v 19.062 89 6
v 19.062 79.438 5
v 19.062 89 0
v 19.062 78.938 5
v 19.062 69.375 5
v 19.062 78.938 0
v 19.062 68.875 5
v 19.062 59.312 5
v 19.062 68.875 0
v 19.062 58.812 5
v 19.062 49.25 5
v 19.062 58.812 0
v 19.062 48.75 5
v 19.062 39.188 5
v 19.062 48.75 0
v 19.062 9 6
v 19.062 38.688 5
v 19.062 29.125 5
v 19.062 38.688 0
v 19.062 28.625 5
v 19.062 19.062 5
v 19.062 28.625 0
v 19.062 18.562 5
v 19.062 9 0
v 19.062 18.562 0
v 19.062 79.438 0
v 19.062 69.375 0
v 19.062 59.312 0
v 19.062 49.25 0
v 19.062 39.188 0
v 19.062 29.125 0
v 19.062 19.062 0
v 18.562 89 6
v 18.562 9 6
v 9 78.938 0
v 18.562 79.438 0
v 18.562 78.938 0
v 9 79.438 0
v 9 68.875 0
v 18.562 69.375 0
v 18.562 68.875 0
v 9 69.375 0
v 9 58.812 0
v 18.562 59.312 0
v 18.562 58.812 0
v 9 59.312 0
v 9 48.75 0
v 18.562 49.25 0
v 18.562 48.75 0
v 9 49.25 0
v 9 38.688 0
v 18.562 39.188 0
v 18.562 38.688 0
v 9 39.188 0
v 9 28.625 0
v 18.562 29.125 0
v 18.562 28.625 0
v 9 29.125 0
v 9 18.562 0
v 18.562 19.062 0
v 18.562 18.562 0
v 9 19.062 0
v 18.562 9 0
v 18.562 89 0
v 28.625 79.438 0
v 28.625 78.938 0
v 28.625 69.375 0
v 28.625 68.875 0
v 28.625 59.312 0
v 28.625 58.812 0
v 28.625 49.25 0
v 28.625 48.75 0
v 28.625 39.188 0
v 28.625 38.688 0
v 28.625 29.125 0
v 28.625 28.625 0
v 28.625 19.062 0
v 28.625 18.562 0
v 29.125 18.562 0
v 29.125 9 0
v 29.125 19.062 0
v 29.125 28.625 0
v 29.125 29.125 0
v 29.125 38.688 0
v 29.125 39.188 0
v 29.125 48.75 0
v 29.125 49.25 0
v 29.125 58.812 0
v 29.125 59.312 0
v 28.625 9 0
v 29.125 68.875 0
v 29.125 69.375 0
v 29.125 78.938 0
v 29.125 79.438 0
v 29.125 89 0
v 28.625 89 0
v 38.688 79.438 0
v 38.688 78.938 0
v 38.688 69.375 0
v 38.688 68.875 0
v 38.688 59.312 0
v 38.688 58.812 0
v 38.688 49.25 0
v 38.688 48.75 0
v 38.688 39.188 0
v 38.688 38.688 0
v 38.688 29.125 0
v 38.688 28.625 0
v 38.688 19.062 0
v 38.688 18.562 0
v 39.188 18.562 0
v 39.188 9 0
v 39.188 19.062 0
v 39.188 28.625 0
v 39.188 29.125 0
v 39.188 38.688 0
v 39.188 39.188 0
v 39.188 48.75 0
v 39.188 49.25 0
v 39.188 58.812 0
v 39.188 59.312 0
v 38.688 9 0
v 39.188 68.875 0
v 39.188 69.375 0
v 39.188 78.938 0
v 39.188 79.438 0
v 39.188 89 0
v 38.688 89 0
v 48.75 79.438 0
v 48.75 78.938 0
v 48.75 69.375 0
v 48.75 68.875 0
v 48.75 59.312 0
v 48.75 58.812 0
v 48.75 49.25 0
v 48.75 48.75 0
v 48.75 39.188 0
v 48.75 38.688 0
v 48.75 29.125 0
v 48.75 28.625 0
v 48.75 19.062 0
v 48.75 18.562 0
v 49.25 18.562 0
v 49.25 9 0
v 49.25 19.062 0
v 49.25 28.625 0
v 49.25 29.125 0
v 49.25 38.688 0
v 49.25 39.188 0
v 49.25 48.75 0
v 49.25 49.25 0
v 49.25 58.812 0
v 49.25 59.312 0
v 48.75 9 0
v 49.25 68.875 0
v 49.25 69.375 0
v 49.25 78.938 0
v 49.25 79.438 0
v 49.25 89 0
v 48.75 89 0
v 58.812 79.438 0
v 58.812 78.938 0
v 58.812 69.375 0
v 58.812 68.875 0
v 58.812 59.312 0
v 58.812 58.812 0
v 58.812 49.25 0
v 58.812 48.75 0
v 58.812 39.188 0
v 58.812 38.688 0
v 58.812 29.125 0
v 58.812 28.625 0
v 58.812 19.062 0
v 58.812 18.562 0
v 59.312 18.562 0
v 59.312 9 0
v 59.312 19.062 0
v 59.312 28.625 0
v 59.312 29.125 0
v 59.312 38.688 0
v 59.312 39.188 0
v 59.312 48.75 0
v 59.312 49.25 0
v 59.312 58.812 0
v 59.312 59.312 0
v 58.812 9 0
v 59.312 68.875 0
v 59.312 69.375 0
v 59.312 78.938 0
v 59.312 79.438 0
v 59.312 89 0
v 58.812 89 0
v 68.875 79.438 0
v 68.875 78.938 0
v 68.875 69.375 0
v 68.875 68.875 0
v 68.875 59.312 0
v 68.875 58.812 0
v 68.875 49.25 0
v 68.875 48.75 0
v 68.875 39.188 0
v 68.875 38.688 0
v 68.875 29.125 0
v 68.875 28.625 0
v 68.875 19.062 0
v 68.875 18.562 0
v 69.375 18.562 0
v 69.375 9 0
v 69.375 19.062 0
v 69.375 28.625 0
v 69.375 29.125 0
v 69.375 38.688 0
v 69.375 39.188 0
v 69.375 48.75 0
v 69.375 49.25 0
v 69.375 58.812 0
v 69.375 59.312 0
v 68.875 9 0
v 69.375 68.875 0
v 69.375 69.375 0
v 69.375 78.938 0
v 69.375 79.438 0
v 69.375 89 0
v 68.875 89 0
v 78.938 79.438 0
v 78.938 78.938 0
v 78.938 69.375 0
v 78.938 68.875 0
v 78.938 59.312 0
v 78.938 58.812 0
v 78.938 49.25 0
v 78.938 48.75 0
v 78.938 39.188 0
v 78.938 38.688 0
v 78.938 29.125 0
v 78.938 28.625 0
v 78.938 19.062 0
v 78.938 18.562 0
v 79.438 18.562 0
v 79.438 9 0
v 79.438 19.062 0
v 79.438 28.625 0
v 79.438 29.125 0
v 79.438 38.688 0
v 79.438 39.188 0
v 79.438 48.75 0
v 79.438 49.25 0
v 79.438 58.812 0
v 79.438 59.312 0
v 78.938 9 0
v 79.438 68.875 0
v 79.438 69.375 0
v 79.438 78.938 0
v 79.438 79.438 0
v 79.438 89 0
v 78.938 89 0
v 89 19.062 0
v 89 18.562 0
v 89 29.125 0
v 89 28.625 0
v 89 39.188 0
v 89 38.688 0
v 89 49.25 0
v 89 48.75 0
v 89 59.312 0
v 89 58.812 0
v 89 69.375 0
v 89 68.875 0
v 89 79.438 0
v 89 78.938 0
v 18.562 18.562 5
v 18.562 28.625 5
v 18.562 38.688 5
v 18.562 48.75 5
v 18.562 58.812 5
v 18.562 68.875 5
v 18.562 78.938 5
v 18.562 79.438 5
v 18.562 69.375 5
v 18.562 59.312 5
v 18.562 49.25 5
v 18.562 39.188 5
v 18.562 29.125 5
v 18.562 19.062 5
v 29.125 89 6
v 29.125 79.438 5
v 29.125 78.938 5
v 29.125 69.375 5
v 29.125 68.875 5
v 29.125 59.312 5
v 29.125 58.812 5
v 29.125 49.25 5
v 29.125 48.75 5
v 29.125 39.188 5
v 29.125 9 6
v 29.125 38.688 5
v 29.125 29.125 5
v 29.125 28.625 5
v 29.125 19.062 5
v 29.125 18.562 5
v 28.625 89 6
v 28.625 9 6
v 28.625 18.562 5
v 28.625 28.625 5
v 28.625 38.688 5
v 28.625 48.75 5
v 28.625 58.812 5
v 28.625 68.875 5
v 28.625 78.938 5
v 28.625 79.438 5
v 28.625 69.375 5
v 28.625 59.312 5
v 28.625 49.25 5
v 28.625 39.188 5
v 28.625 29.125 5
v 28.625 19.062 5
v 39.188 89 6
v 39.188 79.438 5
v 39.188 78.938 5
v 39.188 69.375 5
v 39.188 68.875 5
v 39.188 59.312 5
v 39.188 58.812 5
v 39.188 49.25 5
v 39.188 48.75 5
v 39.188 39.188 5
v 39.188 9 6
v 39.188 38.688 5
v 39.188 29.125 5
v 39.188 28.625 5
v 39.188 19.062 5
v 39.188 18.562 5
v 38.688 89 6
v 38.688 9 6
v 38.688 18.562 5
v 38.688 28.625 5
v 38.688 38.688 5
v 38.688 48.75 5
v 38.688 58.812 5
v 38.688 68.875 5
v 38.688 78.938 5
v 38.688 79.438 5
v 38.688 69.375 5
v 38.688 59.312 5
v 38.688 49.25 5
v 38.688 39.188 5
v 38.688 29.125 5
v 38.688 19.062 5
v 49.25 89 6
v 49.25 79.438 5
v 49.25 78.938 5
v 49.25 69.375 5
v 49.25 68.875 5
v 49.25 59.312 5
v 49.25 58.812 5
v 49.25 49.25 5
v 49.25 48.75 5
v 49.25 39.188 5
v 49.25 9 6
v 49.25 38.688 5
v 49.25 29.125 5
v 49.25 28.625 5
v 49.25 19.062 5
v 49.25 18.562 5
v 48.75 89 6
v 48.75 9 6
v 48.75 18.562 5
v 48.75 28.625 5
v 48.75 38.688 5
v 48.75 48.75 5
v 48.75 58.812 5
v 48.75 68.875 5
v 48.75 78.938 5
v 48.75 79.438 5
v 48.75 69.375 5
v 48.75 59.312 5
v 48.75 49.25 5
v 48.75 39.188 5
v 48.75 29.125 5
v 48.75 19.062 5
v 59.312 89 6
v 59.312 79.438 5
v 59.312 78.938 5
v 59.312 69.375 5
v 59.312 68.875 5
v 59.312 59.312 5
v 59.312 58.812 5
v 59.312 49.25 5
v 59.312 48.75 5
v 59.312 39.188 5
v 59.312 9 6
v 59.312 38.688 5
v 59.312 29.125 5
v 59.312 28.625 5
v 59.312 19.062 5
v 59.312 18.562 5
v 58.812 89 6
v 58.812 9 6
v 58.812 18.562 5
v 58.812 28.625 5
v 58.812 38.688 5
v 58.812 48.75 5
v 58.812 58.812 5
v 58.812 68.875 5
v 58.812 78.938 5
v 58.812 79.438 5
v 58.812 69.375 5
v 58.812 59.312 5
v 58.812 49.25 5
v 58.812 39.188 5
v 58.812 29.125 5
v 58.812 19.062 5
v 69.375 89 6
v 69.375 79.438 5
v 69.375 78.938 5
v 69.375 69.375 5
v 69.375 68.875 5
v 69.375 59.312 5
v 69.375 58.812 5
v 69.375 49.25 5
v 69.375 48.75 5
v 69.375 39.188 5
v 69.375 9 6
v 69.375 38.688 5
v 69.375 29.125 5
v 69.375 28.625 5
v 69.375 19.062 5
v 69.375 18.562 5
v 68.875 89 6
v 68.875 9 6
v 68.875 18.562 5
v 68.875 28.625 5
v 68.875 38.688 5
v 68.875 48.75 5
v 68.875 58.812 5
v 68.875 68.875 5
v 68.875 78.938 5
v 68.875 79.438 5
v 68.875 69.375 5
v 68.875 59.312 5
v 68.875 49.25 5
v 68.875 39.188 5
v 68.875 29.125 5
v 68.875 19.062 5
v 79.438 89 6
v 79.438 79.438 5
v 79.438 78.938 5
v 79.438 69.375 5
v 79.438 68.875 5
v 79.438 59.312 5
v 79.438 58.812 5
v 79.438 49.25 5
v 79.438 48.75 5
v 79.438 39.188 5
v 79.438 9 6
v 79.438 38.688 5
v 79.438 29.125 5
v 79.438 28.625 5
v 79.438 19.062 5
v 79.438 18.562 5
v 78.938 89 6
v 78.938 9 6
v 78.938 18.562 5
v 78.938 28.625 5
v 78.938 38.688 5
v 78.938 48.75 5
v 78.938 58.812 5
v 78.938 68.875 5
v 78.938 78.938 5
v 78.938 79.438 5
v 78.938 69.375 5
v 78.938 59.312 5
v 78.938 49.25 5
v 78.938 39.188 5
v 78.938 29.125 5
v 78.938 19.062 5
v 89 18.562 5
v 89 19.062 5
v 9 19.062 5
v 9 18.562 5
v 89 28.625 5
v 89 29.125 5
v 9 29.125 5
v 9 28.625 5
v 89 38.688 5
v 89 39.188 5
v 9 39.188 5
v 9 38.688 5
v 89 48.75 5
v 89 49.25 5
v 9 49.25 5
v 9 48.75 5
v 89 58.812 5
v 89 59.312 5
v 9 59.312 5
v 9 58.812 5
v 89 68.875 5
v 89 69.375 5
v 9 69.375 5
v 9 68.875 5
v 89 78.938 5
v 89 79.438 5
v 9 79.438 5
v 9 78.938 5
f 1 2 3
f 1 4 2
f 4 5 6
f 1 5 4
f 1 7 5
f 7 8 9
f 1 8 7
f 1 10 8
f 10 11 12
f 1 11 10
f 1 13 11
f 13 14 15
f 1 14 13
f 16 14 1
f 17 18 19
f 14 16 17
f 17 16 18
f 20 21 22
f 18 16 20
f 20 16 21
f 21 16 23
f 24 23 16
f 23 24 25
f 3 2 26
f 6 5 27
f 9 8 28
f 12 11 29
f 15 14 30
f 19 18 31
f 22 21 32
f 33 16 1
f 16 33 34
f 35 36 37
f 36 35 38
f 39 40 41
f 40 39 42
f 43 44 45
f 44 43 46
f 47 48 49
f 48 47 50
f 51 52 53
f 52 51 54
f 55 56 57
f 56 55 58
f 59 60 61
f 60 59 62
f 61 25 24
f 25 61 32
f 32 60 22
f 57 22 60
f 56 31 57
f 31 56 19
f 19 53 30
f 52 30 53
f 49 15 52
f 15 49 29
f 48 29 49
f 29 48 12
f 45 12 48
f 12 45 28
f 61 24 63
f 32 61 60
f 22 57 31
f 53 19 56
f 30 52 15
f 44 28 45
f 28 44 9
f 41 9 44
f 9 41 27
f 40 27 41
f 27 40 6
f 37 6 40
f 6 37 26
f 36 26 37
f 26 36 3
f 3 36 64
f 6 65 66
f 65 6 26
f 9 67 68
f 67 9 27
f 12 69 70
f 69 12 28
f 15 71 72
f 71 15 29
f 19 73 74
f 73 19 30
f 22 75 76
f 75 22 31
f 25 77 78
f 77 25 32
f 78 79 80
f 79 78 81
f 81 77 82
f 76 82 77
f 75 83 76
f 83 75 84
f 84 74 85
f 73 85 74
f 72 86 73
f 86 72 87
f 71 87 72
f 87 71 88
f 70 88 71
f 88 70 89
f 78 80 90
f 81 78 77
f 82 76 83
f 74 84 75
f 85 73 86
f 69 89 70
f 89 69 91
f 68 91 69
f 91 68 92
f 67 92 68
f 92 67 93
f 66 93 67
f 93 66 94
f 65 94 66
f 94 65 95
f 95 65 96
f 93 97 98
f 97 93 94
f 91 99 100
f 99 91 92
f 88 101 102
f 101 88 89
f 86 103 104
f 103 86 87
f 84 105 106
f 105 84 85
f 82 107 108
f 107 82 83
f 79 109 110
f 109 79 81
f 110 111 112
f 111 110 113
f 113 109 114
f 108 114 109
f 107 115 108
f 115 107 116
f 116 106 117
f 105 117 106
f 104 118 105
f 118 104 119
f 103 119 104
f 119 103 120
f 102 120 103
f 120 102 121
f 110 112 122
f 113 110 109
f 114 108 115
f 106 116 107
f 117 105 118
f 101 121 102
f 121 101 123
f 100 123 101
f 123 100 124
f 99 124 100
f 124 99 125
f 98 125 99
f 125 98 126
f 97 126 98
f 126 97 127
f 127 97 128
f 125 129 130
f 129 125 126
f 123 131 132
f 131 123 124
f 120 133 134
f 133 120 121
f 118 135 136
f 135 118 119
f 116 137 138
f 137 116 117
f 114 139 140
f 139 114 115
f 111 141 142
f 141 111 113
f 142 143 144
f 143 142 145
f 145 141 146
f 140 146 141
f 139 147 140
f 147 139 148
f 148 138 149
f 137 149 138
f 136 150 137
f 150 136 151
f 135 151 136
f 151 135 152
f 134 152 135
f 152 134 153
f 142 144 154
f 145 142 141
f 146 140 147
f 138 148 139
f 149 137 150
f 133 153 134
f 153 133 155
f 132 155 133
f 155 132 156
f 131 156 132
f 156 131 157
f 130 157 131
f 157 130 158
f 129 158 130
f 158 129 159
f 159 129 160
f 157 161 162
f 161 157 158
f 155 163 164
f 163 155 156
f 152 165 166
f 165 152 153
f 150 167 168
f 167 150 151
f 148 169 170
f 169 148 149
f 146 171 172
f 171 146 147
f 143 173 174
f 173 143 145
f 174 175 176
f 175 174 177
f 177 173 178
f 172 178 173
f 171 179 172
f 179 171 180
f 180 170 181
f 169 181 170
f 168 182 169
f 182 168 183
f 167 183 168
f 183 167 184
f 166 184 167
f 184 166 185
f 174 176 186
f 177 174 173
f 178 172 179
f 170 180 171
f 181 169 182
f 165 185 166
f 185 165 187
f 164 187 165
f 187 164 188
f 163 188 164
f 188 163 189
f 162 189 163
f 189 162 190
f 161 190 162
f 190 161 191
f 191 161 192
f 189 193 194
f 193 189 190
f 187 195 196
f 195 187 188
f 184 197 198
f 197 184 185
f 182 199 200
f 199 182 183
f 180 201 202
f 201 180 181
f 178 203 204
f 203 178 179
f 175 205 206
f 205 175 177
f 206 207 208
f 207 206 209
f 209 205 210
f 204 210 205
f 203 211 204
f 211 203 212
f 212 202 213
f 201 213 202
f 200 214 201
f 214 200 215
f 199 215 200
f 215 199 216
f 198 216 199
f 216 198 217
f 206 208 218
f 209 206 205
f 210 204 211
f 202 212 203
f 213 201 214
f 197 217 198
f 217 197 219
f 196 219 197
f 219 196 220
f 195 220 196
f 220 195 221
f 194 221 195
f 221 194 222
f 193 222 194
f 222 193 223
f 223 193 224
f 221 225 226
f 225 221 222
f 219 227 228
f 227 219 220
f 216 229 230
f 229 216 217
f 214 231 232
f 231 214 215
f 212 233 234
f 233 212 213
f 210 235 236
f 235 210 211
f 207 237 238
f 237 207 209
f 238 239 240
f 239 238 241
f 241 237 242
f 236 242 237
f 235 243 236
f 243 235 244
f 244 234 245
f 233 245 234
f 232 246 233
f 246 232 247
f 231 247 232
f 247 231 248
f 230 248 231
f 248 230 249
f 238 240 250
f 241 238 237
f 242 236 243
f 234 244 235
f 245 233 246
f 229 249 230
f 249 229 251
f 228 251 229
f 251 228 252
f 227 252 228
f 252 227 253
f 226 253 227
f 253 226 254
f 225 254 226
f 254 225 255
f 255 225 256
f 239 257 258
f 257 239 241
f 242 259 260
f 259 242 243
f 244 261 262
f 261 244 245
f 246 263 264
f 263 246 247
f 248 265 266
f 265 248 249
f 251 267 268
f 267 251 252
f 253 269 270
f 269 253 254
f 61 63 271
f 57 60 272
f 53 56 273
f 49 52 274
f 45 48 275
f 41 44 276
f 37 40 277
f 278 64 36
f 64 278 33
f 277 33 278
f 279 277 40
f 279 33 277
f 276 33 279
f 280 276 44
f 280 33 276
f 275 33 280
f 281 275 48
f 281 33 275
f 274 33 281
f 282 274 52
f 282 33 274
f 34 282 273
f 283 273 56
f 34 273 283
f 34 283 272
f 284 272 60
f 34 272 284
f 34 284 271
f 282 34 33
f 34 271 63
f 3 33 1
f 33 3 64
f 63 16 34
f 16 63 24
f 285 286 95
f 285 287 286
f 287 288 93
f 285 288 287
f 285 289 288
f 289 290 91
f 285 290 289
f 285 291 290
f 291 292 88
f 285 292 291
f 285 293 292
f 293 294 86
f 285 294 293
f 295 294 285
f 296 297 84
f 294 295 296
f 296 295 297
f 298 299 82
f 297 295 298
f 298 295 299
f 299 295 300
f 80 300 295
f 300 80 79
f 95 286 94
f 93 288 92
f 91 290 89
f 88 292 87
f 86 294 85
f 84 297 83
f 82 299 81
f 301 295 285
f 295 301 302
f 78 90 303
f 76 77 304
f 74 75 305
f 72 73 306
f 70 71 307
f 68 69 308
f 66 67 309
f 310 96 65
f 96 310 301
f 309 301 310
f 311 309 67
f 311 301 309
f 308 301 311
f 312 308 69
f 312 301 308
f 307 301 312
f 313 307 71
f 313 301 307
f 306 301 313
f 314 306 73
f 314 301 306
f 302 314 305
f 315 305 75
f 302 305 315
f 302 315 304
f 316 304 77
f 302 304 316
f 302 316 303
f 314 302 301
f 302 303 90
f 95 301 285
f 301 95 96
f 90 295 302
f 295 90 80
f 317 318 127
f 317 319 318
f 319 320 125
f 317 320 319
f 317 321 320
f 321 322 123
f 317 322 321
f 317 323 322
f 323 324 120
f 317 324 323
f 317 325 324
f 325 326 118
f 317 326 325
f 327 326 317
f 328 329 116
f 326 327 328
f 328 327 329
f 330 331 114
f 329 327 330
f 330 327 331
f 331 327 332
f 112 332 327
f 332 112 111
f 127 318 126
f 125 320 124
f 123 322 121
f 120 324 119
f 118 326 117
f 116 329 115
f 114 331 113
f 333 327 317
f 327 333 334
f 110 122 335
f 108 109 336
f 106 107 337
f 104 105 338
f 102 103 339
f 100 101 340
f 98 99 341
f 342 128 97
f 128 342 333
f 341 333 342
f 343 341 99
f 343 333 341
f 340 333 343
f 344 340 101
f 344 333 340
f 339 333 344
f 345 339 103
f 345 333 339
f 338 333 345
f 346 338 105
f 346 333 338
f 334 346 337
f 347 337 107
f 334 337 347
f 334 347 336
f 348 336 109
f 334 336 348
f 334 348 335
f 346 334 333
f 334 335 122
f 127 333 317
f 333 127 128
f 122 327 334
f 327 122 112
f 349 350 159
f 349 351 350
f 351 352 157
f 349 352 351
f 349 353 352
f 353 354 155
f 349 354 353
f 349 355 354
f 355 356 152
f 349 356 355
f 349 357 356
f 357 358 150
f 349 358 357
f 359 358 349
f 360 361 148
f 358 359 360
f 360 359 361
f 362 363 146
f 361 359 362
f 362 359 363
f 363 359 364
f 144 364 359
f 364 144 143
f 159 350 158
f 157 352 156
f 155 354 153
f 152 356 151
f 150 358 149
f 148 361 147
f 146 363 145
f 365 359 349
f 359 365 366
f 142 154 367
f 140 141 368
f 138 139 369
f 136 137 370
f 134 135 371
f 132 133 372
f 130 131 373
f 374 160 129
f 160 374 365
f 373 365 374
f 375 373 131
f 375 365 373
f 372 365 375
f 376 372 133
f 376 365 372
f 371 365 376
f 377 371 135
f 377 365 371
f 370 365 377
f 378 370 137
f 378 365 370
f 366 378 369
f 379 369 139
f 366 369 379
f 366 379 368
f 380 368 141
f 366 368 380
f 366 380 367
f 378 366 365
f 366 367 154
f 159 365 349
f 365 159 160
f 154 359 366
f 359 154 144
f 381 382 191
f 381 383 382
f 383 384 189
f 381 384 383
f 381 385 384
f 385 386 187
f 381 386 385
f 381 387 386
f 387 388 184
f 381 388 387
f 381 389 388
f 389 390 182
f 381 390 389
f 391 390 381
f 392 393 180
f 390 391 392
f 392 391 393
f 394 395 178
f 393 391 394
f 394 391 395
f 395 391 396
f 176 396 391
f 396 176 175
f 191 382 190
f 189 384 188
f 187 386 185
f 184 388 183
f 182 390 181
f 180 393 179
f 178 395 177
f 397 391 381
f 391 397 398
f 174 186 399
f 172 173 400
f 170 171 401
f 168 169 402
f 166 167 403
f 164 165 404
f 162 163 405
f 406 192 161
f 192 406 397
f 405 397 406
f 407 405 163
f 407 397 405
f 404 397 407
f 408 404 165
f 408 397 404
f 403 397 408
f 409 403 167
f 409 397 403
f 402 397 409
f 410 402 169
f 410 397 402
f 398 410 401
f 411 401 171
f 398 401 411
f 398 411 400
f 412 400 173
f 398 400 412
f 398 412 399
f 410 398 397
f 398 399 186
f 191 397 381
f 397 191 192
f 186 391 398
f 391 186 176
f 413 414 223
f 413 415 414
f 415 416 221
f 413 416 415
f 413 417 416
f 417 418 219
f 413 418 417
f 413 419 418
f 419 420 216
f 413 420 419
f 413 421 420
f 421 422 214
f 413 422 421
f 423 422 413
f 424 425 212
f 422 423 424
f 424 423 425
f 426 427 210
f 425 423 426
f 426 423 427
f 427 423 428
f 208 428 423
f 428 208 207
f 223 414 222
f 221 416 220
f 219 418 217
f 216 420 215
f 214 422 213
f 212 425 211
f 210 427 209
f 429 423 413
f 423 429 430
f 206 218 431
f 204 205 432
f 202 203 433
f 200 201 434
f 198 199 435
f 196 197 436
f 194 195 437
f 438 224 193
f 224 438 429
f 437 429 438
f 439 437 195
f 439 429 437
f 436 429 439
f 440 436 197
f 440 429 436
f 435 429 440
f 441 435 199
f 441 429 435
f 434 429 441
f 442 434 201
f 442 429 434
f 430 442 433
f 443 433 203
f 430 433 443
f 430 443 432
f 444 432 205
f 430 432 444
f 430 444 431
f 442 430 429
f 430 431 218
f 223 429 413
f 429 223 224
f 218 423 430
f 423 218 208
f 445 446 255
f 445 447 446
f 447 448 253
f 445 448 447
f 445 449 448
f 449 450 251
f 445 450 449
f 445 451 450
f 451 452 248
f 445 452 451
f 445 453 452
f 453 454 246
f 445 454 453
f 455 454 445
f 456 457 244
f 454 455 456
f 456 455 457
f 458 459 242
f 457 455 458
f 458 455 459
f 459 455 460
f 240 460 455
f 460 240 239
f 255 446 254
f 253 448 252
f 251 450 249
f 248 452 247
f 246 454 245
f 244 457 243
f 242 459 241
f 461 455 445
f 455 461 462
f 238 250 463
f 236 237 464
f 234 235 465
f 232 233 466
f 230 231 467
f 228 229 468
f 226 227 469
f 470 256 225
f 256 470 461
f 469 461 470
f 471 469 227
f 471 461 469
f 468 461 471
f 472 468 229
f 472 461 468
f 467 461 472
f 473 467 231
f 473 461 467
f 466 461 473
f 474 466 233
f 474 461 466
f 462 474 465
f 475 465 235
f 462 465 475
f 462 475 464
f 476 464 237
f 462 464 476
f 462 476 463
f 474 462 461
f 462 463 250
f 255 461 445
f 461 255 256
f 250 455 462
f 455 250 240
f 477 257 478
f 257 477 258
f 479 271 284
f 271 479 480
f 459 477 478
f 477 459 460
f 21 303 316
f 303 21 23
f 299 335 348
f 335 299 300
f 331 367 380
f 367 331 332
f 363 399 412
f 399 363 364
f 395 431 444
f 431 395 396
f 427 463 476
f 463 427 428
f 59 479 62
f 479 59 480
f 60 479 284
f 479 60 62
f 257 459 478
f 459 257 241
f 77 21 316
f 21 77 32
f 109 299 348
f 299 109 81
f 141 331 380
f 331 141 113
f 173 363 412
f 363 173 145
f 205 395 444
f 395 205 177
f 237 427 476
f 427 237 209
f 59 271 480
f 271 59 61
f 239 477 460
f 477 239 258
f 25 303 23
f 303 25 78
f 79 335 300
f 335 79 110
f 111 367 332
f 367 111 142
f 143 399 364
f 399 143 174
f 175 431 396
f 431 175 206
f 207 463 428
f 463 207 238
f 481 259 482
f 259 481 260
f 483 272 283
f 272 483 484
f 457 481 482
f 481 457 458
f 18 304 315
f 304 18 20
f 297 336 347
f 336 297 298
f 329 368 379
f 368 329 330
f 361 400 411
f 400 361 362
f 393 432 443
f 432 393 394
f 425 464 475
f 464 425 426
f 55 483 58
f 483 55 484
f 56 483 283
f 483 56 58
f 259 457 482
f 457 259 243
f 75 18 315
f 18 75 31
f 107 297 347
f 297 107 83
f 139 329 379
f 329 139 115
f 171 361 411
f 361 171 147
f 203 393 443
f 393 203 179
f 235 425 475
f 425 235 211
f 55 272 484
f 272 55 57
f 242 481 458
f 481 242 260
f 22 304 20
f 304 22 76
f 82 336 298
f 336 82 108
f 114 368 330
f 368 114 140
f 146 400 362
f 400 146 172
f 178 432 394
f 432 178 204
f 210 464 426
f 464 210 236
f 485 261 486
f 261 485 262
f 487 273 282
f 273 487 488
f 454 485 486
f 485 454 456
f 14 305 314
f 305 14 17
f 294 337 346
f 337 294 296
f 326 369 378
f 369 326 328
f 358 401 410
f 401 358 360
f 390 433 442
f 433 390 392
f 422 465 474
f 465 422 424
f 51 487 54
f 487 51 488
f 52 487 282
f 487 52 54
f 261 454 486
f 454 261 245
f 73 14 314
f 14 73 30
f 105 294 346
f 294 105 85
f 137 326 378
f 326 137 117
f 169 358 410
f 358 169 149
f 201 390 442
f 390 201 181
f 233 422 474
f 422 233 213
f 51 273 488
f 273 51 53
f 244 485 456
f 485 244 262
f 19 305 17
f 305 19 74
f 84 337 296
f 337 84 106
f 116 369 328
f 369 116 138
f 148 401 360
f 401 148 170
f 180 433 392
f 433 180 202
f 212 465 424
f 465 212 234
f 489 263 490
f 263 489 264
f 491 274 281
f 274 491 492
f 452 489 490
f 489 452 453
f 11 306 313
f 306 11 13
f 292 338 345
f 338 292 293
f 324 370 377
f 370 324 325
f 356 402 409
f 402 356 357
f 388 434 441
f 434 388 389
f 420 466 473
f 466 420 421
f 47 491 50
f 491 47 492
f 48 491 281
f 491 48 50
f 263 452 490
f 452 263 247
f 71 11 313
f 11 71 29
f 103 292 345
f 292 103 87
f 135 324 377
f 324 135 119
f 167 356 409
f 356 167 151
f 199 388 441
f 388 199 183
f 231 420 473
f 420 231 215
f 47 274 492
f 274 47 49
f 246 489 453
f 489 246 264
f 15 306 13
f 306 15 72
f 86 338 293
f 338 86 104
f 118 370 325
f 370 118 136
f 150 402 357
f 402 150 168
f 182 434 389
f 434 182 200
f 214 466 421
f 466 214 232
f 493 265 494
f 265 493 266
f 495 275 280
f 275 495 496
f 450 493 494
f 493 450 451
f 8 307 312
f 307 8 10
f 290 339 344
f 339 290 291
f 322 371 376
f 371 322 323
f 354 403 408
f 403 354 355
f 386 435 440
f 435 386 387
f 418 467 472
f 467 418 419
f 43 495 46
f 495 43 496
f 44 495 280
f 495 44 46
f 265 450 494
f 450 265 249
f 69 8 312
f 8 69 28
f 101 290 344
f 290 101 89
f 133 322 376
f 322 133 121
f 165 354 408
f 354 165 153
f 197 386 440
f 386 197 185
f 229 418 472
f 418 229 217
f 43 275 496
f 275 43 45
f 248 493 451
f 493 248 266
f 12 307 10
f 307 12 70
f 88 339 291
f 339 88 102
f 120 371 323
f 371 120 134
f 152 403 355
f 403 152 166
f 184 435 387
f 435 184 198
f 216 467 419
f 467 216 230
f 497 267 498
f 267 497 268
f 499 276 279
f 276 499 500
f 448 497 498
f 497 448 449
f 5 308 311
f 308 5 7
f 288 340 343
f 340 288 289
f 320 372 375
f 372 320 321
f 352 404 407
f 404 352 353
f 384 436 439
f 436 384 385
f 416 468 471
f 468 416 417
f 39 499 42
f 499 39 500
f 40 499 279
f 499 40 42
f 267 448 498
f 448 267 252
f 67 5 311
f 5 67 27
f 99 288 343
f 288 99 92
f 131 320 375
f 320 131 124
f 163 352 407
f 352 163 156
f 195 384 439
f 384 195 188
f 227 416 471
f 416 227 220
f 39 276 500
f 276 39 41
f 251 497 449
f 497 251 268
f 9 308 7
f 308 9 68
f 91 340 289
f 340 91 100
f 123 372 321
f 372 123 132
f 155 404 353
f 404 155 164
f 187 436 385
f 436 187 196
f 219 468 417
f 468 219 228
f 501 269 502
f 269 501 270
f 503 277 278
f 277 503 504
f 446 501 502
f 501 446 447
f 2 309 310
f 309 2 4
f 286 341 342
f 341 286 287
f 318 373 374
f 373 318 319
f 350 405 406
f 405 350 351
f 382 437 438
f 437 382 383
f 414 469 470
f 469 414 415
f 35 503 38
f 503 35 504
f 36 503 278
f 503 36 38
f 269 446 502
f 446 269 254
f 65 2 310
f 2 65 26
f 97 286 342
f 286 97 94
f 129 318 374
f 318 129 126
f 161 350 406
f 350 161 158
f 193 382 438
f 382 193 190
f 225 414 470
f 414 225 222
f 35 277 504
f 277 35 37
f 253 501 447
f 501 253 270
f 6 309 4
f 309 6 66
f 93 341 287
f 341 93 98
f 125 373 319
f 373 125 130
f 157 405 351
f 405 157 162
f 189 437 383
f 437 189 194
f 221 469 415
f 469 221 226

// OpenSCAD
// ========================
// Parameters
// ========================

// Case (2 mm shorter than the bottom, aka 1 mm on each side)
case_width = 98;
case_lenght = 98;
case_height = 6.5;

// Outer cylinder
outer_r = 4;
outer_h = case_height;

// Inner hole
hole_r = 2;
hole_h = case_height;

// increase for smoother cone ($fn)
segments = 64;

// smooth corners
$fn = segments;   

// ========================
// Cover for the NeoPixel panel
// ========================
module panel_cover() {
    difference() {
     
        translate([8.5, 8.5, 0])
            cube([81, 81, case_height]);

        // Field for the NeoPixel panel

        translate([9, 9, 0])
            cube([80, 80, case_height]);

    }
}

// ========================
// Holders for the NeoPixel panel
// ========================
module panel_holders() {
    difference() {

        union() {
            // Middle left
            translate([2, case_width/2-outer_r, 0])
                    mounting_hole_round();

            // Middle right
            translate([case_width-2*outer_r-2, case_width/2-outer_r, 0])
                    mounting_hole_round();

        }

        translate([8.5, 8.5, 0])
            cube([81, 81, case_height]);
    }
}
    
// ========================
// Mounting holes
// ========================
module mounting_hole_round() {
    // Position at start
    translate([outer_r, outer_r, 0]) {
        difference() {
            // Outer cylinder
            cylinder(h = outer_h, r = outer_r, $fn = segments);

            // Inner hole
            translate([0, 0, outer_h-hole_h])
                cylinder(h = hole_h, r = hole_r, $fn = segments);
        }
    }
}

module grid(cell = 9.5625, wall = 0.5, height = case_height, diffuser = true) {
    rows = 8;
    cols = 8;

    if (false == diffuser) {
        // Vertical walls
        for (i = [1:cols-1]) {
            translate([
                i * cell + (i-1) * wall,
                0,
                0
            ])
                color("black")
                    cube([wall, rows*cell+(rows-1)*wall, height]);
        }

        // Horizontal walls
        for (j = [1:rows-1]) {
            translate([
                0,
                j * cell + (j-1) * wall,
                0
            ])
                color("black")
                    cube([cols * cell+(cols-1)*wall, wall, height-1]);
        }
    }
    else if (true == diffuser) {
        // White cubes inside each cell, height = 1
        color("white")
        for (i = [0:cols-1]) {
            for (j = [0:rows-1]) {
                translate([
                    i * (cell + wall),
                    j * (cell + wall),
                    0
                ])
                    cube([cell, cell, 1]);
            }
        }
    }
}

// ========================
// Top case
// ========================

union() {
    translate([9, 9, 0])
            //grid();
            grid(cell = 9.5625, wall = 0.5, height = case_height-0.5, diffuser = false);
}
